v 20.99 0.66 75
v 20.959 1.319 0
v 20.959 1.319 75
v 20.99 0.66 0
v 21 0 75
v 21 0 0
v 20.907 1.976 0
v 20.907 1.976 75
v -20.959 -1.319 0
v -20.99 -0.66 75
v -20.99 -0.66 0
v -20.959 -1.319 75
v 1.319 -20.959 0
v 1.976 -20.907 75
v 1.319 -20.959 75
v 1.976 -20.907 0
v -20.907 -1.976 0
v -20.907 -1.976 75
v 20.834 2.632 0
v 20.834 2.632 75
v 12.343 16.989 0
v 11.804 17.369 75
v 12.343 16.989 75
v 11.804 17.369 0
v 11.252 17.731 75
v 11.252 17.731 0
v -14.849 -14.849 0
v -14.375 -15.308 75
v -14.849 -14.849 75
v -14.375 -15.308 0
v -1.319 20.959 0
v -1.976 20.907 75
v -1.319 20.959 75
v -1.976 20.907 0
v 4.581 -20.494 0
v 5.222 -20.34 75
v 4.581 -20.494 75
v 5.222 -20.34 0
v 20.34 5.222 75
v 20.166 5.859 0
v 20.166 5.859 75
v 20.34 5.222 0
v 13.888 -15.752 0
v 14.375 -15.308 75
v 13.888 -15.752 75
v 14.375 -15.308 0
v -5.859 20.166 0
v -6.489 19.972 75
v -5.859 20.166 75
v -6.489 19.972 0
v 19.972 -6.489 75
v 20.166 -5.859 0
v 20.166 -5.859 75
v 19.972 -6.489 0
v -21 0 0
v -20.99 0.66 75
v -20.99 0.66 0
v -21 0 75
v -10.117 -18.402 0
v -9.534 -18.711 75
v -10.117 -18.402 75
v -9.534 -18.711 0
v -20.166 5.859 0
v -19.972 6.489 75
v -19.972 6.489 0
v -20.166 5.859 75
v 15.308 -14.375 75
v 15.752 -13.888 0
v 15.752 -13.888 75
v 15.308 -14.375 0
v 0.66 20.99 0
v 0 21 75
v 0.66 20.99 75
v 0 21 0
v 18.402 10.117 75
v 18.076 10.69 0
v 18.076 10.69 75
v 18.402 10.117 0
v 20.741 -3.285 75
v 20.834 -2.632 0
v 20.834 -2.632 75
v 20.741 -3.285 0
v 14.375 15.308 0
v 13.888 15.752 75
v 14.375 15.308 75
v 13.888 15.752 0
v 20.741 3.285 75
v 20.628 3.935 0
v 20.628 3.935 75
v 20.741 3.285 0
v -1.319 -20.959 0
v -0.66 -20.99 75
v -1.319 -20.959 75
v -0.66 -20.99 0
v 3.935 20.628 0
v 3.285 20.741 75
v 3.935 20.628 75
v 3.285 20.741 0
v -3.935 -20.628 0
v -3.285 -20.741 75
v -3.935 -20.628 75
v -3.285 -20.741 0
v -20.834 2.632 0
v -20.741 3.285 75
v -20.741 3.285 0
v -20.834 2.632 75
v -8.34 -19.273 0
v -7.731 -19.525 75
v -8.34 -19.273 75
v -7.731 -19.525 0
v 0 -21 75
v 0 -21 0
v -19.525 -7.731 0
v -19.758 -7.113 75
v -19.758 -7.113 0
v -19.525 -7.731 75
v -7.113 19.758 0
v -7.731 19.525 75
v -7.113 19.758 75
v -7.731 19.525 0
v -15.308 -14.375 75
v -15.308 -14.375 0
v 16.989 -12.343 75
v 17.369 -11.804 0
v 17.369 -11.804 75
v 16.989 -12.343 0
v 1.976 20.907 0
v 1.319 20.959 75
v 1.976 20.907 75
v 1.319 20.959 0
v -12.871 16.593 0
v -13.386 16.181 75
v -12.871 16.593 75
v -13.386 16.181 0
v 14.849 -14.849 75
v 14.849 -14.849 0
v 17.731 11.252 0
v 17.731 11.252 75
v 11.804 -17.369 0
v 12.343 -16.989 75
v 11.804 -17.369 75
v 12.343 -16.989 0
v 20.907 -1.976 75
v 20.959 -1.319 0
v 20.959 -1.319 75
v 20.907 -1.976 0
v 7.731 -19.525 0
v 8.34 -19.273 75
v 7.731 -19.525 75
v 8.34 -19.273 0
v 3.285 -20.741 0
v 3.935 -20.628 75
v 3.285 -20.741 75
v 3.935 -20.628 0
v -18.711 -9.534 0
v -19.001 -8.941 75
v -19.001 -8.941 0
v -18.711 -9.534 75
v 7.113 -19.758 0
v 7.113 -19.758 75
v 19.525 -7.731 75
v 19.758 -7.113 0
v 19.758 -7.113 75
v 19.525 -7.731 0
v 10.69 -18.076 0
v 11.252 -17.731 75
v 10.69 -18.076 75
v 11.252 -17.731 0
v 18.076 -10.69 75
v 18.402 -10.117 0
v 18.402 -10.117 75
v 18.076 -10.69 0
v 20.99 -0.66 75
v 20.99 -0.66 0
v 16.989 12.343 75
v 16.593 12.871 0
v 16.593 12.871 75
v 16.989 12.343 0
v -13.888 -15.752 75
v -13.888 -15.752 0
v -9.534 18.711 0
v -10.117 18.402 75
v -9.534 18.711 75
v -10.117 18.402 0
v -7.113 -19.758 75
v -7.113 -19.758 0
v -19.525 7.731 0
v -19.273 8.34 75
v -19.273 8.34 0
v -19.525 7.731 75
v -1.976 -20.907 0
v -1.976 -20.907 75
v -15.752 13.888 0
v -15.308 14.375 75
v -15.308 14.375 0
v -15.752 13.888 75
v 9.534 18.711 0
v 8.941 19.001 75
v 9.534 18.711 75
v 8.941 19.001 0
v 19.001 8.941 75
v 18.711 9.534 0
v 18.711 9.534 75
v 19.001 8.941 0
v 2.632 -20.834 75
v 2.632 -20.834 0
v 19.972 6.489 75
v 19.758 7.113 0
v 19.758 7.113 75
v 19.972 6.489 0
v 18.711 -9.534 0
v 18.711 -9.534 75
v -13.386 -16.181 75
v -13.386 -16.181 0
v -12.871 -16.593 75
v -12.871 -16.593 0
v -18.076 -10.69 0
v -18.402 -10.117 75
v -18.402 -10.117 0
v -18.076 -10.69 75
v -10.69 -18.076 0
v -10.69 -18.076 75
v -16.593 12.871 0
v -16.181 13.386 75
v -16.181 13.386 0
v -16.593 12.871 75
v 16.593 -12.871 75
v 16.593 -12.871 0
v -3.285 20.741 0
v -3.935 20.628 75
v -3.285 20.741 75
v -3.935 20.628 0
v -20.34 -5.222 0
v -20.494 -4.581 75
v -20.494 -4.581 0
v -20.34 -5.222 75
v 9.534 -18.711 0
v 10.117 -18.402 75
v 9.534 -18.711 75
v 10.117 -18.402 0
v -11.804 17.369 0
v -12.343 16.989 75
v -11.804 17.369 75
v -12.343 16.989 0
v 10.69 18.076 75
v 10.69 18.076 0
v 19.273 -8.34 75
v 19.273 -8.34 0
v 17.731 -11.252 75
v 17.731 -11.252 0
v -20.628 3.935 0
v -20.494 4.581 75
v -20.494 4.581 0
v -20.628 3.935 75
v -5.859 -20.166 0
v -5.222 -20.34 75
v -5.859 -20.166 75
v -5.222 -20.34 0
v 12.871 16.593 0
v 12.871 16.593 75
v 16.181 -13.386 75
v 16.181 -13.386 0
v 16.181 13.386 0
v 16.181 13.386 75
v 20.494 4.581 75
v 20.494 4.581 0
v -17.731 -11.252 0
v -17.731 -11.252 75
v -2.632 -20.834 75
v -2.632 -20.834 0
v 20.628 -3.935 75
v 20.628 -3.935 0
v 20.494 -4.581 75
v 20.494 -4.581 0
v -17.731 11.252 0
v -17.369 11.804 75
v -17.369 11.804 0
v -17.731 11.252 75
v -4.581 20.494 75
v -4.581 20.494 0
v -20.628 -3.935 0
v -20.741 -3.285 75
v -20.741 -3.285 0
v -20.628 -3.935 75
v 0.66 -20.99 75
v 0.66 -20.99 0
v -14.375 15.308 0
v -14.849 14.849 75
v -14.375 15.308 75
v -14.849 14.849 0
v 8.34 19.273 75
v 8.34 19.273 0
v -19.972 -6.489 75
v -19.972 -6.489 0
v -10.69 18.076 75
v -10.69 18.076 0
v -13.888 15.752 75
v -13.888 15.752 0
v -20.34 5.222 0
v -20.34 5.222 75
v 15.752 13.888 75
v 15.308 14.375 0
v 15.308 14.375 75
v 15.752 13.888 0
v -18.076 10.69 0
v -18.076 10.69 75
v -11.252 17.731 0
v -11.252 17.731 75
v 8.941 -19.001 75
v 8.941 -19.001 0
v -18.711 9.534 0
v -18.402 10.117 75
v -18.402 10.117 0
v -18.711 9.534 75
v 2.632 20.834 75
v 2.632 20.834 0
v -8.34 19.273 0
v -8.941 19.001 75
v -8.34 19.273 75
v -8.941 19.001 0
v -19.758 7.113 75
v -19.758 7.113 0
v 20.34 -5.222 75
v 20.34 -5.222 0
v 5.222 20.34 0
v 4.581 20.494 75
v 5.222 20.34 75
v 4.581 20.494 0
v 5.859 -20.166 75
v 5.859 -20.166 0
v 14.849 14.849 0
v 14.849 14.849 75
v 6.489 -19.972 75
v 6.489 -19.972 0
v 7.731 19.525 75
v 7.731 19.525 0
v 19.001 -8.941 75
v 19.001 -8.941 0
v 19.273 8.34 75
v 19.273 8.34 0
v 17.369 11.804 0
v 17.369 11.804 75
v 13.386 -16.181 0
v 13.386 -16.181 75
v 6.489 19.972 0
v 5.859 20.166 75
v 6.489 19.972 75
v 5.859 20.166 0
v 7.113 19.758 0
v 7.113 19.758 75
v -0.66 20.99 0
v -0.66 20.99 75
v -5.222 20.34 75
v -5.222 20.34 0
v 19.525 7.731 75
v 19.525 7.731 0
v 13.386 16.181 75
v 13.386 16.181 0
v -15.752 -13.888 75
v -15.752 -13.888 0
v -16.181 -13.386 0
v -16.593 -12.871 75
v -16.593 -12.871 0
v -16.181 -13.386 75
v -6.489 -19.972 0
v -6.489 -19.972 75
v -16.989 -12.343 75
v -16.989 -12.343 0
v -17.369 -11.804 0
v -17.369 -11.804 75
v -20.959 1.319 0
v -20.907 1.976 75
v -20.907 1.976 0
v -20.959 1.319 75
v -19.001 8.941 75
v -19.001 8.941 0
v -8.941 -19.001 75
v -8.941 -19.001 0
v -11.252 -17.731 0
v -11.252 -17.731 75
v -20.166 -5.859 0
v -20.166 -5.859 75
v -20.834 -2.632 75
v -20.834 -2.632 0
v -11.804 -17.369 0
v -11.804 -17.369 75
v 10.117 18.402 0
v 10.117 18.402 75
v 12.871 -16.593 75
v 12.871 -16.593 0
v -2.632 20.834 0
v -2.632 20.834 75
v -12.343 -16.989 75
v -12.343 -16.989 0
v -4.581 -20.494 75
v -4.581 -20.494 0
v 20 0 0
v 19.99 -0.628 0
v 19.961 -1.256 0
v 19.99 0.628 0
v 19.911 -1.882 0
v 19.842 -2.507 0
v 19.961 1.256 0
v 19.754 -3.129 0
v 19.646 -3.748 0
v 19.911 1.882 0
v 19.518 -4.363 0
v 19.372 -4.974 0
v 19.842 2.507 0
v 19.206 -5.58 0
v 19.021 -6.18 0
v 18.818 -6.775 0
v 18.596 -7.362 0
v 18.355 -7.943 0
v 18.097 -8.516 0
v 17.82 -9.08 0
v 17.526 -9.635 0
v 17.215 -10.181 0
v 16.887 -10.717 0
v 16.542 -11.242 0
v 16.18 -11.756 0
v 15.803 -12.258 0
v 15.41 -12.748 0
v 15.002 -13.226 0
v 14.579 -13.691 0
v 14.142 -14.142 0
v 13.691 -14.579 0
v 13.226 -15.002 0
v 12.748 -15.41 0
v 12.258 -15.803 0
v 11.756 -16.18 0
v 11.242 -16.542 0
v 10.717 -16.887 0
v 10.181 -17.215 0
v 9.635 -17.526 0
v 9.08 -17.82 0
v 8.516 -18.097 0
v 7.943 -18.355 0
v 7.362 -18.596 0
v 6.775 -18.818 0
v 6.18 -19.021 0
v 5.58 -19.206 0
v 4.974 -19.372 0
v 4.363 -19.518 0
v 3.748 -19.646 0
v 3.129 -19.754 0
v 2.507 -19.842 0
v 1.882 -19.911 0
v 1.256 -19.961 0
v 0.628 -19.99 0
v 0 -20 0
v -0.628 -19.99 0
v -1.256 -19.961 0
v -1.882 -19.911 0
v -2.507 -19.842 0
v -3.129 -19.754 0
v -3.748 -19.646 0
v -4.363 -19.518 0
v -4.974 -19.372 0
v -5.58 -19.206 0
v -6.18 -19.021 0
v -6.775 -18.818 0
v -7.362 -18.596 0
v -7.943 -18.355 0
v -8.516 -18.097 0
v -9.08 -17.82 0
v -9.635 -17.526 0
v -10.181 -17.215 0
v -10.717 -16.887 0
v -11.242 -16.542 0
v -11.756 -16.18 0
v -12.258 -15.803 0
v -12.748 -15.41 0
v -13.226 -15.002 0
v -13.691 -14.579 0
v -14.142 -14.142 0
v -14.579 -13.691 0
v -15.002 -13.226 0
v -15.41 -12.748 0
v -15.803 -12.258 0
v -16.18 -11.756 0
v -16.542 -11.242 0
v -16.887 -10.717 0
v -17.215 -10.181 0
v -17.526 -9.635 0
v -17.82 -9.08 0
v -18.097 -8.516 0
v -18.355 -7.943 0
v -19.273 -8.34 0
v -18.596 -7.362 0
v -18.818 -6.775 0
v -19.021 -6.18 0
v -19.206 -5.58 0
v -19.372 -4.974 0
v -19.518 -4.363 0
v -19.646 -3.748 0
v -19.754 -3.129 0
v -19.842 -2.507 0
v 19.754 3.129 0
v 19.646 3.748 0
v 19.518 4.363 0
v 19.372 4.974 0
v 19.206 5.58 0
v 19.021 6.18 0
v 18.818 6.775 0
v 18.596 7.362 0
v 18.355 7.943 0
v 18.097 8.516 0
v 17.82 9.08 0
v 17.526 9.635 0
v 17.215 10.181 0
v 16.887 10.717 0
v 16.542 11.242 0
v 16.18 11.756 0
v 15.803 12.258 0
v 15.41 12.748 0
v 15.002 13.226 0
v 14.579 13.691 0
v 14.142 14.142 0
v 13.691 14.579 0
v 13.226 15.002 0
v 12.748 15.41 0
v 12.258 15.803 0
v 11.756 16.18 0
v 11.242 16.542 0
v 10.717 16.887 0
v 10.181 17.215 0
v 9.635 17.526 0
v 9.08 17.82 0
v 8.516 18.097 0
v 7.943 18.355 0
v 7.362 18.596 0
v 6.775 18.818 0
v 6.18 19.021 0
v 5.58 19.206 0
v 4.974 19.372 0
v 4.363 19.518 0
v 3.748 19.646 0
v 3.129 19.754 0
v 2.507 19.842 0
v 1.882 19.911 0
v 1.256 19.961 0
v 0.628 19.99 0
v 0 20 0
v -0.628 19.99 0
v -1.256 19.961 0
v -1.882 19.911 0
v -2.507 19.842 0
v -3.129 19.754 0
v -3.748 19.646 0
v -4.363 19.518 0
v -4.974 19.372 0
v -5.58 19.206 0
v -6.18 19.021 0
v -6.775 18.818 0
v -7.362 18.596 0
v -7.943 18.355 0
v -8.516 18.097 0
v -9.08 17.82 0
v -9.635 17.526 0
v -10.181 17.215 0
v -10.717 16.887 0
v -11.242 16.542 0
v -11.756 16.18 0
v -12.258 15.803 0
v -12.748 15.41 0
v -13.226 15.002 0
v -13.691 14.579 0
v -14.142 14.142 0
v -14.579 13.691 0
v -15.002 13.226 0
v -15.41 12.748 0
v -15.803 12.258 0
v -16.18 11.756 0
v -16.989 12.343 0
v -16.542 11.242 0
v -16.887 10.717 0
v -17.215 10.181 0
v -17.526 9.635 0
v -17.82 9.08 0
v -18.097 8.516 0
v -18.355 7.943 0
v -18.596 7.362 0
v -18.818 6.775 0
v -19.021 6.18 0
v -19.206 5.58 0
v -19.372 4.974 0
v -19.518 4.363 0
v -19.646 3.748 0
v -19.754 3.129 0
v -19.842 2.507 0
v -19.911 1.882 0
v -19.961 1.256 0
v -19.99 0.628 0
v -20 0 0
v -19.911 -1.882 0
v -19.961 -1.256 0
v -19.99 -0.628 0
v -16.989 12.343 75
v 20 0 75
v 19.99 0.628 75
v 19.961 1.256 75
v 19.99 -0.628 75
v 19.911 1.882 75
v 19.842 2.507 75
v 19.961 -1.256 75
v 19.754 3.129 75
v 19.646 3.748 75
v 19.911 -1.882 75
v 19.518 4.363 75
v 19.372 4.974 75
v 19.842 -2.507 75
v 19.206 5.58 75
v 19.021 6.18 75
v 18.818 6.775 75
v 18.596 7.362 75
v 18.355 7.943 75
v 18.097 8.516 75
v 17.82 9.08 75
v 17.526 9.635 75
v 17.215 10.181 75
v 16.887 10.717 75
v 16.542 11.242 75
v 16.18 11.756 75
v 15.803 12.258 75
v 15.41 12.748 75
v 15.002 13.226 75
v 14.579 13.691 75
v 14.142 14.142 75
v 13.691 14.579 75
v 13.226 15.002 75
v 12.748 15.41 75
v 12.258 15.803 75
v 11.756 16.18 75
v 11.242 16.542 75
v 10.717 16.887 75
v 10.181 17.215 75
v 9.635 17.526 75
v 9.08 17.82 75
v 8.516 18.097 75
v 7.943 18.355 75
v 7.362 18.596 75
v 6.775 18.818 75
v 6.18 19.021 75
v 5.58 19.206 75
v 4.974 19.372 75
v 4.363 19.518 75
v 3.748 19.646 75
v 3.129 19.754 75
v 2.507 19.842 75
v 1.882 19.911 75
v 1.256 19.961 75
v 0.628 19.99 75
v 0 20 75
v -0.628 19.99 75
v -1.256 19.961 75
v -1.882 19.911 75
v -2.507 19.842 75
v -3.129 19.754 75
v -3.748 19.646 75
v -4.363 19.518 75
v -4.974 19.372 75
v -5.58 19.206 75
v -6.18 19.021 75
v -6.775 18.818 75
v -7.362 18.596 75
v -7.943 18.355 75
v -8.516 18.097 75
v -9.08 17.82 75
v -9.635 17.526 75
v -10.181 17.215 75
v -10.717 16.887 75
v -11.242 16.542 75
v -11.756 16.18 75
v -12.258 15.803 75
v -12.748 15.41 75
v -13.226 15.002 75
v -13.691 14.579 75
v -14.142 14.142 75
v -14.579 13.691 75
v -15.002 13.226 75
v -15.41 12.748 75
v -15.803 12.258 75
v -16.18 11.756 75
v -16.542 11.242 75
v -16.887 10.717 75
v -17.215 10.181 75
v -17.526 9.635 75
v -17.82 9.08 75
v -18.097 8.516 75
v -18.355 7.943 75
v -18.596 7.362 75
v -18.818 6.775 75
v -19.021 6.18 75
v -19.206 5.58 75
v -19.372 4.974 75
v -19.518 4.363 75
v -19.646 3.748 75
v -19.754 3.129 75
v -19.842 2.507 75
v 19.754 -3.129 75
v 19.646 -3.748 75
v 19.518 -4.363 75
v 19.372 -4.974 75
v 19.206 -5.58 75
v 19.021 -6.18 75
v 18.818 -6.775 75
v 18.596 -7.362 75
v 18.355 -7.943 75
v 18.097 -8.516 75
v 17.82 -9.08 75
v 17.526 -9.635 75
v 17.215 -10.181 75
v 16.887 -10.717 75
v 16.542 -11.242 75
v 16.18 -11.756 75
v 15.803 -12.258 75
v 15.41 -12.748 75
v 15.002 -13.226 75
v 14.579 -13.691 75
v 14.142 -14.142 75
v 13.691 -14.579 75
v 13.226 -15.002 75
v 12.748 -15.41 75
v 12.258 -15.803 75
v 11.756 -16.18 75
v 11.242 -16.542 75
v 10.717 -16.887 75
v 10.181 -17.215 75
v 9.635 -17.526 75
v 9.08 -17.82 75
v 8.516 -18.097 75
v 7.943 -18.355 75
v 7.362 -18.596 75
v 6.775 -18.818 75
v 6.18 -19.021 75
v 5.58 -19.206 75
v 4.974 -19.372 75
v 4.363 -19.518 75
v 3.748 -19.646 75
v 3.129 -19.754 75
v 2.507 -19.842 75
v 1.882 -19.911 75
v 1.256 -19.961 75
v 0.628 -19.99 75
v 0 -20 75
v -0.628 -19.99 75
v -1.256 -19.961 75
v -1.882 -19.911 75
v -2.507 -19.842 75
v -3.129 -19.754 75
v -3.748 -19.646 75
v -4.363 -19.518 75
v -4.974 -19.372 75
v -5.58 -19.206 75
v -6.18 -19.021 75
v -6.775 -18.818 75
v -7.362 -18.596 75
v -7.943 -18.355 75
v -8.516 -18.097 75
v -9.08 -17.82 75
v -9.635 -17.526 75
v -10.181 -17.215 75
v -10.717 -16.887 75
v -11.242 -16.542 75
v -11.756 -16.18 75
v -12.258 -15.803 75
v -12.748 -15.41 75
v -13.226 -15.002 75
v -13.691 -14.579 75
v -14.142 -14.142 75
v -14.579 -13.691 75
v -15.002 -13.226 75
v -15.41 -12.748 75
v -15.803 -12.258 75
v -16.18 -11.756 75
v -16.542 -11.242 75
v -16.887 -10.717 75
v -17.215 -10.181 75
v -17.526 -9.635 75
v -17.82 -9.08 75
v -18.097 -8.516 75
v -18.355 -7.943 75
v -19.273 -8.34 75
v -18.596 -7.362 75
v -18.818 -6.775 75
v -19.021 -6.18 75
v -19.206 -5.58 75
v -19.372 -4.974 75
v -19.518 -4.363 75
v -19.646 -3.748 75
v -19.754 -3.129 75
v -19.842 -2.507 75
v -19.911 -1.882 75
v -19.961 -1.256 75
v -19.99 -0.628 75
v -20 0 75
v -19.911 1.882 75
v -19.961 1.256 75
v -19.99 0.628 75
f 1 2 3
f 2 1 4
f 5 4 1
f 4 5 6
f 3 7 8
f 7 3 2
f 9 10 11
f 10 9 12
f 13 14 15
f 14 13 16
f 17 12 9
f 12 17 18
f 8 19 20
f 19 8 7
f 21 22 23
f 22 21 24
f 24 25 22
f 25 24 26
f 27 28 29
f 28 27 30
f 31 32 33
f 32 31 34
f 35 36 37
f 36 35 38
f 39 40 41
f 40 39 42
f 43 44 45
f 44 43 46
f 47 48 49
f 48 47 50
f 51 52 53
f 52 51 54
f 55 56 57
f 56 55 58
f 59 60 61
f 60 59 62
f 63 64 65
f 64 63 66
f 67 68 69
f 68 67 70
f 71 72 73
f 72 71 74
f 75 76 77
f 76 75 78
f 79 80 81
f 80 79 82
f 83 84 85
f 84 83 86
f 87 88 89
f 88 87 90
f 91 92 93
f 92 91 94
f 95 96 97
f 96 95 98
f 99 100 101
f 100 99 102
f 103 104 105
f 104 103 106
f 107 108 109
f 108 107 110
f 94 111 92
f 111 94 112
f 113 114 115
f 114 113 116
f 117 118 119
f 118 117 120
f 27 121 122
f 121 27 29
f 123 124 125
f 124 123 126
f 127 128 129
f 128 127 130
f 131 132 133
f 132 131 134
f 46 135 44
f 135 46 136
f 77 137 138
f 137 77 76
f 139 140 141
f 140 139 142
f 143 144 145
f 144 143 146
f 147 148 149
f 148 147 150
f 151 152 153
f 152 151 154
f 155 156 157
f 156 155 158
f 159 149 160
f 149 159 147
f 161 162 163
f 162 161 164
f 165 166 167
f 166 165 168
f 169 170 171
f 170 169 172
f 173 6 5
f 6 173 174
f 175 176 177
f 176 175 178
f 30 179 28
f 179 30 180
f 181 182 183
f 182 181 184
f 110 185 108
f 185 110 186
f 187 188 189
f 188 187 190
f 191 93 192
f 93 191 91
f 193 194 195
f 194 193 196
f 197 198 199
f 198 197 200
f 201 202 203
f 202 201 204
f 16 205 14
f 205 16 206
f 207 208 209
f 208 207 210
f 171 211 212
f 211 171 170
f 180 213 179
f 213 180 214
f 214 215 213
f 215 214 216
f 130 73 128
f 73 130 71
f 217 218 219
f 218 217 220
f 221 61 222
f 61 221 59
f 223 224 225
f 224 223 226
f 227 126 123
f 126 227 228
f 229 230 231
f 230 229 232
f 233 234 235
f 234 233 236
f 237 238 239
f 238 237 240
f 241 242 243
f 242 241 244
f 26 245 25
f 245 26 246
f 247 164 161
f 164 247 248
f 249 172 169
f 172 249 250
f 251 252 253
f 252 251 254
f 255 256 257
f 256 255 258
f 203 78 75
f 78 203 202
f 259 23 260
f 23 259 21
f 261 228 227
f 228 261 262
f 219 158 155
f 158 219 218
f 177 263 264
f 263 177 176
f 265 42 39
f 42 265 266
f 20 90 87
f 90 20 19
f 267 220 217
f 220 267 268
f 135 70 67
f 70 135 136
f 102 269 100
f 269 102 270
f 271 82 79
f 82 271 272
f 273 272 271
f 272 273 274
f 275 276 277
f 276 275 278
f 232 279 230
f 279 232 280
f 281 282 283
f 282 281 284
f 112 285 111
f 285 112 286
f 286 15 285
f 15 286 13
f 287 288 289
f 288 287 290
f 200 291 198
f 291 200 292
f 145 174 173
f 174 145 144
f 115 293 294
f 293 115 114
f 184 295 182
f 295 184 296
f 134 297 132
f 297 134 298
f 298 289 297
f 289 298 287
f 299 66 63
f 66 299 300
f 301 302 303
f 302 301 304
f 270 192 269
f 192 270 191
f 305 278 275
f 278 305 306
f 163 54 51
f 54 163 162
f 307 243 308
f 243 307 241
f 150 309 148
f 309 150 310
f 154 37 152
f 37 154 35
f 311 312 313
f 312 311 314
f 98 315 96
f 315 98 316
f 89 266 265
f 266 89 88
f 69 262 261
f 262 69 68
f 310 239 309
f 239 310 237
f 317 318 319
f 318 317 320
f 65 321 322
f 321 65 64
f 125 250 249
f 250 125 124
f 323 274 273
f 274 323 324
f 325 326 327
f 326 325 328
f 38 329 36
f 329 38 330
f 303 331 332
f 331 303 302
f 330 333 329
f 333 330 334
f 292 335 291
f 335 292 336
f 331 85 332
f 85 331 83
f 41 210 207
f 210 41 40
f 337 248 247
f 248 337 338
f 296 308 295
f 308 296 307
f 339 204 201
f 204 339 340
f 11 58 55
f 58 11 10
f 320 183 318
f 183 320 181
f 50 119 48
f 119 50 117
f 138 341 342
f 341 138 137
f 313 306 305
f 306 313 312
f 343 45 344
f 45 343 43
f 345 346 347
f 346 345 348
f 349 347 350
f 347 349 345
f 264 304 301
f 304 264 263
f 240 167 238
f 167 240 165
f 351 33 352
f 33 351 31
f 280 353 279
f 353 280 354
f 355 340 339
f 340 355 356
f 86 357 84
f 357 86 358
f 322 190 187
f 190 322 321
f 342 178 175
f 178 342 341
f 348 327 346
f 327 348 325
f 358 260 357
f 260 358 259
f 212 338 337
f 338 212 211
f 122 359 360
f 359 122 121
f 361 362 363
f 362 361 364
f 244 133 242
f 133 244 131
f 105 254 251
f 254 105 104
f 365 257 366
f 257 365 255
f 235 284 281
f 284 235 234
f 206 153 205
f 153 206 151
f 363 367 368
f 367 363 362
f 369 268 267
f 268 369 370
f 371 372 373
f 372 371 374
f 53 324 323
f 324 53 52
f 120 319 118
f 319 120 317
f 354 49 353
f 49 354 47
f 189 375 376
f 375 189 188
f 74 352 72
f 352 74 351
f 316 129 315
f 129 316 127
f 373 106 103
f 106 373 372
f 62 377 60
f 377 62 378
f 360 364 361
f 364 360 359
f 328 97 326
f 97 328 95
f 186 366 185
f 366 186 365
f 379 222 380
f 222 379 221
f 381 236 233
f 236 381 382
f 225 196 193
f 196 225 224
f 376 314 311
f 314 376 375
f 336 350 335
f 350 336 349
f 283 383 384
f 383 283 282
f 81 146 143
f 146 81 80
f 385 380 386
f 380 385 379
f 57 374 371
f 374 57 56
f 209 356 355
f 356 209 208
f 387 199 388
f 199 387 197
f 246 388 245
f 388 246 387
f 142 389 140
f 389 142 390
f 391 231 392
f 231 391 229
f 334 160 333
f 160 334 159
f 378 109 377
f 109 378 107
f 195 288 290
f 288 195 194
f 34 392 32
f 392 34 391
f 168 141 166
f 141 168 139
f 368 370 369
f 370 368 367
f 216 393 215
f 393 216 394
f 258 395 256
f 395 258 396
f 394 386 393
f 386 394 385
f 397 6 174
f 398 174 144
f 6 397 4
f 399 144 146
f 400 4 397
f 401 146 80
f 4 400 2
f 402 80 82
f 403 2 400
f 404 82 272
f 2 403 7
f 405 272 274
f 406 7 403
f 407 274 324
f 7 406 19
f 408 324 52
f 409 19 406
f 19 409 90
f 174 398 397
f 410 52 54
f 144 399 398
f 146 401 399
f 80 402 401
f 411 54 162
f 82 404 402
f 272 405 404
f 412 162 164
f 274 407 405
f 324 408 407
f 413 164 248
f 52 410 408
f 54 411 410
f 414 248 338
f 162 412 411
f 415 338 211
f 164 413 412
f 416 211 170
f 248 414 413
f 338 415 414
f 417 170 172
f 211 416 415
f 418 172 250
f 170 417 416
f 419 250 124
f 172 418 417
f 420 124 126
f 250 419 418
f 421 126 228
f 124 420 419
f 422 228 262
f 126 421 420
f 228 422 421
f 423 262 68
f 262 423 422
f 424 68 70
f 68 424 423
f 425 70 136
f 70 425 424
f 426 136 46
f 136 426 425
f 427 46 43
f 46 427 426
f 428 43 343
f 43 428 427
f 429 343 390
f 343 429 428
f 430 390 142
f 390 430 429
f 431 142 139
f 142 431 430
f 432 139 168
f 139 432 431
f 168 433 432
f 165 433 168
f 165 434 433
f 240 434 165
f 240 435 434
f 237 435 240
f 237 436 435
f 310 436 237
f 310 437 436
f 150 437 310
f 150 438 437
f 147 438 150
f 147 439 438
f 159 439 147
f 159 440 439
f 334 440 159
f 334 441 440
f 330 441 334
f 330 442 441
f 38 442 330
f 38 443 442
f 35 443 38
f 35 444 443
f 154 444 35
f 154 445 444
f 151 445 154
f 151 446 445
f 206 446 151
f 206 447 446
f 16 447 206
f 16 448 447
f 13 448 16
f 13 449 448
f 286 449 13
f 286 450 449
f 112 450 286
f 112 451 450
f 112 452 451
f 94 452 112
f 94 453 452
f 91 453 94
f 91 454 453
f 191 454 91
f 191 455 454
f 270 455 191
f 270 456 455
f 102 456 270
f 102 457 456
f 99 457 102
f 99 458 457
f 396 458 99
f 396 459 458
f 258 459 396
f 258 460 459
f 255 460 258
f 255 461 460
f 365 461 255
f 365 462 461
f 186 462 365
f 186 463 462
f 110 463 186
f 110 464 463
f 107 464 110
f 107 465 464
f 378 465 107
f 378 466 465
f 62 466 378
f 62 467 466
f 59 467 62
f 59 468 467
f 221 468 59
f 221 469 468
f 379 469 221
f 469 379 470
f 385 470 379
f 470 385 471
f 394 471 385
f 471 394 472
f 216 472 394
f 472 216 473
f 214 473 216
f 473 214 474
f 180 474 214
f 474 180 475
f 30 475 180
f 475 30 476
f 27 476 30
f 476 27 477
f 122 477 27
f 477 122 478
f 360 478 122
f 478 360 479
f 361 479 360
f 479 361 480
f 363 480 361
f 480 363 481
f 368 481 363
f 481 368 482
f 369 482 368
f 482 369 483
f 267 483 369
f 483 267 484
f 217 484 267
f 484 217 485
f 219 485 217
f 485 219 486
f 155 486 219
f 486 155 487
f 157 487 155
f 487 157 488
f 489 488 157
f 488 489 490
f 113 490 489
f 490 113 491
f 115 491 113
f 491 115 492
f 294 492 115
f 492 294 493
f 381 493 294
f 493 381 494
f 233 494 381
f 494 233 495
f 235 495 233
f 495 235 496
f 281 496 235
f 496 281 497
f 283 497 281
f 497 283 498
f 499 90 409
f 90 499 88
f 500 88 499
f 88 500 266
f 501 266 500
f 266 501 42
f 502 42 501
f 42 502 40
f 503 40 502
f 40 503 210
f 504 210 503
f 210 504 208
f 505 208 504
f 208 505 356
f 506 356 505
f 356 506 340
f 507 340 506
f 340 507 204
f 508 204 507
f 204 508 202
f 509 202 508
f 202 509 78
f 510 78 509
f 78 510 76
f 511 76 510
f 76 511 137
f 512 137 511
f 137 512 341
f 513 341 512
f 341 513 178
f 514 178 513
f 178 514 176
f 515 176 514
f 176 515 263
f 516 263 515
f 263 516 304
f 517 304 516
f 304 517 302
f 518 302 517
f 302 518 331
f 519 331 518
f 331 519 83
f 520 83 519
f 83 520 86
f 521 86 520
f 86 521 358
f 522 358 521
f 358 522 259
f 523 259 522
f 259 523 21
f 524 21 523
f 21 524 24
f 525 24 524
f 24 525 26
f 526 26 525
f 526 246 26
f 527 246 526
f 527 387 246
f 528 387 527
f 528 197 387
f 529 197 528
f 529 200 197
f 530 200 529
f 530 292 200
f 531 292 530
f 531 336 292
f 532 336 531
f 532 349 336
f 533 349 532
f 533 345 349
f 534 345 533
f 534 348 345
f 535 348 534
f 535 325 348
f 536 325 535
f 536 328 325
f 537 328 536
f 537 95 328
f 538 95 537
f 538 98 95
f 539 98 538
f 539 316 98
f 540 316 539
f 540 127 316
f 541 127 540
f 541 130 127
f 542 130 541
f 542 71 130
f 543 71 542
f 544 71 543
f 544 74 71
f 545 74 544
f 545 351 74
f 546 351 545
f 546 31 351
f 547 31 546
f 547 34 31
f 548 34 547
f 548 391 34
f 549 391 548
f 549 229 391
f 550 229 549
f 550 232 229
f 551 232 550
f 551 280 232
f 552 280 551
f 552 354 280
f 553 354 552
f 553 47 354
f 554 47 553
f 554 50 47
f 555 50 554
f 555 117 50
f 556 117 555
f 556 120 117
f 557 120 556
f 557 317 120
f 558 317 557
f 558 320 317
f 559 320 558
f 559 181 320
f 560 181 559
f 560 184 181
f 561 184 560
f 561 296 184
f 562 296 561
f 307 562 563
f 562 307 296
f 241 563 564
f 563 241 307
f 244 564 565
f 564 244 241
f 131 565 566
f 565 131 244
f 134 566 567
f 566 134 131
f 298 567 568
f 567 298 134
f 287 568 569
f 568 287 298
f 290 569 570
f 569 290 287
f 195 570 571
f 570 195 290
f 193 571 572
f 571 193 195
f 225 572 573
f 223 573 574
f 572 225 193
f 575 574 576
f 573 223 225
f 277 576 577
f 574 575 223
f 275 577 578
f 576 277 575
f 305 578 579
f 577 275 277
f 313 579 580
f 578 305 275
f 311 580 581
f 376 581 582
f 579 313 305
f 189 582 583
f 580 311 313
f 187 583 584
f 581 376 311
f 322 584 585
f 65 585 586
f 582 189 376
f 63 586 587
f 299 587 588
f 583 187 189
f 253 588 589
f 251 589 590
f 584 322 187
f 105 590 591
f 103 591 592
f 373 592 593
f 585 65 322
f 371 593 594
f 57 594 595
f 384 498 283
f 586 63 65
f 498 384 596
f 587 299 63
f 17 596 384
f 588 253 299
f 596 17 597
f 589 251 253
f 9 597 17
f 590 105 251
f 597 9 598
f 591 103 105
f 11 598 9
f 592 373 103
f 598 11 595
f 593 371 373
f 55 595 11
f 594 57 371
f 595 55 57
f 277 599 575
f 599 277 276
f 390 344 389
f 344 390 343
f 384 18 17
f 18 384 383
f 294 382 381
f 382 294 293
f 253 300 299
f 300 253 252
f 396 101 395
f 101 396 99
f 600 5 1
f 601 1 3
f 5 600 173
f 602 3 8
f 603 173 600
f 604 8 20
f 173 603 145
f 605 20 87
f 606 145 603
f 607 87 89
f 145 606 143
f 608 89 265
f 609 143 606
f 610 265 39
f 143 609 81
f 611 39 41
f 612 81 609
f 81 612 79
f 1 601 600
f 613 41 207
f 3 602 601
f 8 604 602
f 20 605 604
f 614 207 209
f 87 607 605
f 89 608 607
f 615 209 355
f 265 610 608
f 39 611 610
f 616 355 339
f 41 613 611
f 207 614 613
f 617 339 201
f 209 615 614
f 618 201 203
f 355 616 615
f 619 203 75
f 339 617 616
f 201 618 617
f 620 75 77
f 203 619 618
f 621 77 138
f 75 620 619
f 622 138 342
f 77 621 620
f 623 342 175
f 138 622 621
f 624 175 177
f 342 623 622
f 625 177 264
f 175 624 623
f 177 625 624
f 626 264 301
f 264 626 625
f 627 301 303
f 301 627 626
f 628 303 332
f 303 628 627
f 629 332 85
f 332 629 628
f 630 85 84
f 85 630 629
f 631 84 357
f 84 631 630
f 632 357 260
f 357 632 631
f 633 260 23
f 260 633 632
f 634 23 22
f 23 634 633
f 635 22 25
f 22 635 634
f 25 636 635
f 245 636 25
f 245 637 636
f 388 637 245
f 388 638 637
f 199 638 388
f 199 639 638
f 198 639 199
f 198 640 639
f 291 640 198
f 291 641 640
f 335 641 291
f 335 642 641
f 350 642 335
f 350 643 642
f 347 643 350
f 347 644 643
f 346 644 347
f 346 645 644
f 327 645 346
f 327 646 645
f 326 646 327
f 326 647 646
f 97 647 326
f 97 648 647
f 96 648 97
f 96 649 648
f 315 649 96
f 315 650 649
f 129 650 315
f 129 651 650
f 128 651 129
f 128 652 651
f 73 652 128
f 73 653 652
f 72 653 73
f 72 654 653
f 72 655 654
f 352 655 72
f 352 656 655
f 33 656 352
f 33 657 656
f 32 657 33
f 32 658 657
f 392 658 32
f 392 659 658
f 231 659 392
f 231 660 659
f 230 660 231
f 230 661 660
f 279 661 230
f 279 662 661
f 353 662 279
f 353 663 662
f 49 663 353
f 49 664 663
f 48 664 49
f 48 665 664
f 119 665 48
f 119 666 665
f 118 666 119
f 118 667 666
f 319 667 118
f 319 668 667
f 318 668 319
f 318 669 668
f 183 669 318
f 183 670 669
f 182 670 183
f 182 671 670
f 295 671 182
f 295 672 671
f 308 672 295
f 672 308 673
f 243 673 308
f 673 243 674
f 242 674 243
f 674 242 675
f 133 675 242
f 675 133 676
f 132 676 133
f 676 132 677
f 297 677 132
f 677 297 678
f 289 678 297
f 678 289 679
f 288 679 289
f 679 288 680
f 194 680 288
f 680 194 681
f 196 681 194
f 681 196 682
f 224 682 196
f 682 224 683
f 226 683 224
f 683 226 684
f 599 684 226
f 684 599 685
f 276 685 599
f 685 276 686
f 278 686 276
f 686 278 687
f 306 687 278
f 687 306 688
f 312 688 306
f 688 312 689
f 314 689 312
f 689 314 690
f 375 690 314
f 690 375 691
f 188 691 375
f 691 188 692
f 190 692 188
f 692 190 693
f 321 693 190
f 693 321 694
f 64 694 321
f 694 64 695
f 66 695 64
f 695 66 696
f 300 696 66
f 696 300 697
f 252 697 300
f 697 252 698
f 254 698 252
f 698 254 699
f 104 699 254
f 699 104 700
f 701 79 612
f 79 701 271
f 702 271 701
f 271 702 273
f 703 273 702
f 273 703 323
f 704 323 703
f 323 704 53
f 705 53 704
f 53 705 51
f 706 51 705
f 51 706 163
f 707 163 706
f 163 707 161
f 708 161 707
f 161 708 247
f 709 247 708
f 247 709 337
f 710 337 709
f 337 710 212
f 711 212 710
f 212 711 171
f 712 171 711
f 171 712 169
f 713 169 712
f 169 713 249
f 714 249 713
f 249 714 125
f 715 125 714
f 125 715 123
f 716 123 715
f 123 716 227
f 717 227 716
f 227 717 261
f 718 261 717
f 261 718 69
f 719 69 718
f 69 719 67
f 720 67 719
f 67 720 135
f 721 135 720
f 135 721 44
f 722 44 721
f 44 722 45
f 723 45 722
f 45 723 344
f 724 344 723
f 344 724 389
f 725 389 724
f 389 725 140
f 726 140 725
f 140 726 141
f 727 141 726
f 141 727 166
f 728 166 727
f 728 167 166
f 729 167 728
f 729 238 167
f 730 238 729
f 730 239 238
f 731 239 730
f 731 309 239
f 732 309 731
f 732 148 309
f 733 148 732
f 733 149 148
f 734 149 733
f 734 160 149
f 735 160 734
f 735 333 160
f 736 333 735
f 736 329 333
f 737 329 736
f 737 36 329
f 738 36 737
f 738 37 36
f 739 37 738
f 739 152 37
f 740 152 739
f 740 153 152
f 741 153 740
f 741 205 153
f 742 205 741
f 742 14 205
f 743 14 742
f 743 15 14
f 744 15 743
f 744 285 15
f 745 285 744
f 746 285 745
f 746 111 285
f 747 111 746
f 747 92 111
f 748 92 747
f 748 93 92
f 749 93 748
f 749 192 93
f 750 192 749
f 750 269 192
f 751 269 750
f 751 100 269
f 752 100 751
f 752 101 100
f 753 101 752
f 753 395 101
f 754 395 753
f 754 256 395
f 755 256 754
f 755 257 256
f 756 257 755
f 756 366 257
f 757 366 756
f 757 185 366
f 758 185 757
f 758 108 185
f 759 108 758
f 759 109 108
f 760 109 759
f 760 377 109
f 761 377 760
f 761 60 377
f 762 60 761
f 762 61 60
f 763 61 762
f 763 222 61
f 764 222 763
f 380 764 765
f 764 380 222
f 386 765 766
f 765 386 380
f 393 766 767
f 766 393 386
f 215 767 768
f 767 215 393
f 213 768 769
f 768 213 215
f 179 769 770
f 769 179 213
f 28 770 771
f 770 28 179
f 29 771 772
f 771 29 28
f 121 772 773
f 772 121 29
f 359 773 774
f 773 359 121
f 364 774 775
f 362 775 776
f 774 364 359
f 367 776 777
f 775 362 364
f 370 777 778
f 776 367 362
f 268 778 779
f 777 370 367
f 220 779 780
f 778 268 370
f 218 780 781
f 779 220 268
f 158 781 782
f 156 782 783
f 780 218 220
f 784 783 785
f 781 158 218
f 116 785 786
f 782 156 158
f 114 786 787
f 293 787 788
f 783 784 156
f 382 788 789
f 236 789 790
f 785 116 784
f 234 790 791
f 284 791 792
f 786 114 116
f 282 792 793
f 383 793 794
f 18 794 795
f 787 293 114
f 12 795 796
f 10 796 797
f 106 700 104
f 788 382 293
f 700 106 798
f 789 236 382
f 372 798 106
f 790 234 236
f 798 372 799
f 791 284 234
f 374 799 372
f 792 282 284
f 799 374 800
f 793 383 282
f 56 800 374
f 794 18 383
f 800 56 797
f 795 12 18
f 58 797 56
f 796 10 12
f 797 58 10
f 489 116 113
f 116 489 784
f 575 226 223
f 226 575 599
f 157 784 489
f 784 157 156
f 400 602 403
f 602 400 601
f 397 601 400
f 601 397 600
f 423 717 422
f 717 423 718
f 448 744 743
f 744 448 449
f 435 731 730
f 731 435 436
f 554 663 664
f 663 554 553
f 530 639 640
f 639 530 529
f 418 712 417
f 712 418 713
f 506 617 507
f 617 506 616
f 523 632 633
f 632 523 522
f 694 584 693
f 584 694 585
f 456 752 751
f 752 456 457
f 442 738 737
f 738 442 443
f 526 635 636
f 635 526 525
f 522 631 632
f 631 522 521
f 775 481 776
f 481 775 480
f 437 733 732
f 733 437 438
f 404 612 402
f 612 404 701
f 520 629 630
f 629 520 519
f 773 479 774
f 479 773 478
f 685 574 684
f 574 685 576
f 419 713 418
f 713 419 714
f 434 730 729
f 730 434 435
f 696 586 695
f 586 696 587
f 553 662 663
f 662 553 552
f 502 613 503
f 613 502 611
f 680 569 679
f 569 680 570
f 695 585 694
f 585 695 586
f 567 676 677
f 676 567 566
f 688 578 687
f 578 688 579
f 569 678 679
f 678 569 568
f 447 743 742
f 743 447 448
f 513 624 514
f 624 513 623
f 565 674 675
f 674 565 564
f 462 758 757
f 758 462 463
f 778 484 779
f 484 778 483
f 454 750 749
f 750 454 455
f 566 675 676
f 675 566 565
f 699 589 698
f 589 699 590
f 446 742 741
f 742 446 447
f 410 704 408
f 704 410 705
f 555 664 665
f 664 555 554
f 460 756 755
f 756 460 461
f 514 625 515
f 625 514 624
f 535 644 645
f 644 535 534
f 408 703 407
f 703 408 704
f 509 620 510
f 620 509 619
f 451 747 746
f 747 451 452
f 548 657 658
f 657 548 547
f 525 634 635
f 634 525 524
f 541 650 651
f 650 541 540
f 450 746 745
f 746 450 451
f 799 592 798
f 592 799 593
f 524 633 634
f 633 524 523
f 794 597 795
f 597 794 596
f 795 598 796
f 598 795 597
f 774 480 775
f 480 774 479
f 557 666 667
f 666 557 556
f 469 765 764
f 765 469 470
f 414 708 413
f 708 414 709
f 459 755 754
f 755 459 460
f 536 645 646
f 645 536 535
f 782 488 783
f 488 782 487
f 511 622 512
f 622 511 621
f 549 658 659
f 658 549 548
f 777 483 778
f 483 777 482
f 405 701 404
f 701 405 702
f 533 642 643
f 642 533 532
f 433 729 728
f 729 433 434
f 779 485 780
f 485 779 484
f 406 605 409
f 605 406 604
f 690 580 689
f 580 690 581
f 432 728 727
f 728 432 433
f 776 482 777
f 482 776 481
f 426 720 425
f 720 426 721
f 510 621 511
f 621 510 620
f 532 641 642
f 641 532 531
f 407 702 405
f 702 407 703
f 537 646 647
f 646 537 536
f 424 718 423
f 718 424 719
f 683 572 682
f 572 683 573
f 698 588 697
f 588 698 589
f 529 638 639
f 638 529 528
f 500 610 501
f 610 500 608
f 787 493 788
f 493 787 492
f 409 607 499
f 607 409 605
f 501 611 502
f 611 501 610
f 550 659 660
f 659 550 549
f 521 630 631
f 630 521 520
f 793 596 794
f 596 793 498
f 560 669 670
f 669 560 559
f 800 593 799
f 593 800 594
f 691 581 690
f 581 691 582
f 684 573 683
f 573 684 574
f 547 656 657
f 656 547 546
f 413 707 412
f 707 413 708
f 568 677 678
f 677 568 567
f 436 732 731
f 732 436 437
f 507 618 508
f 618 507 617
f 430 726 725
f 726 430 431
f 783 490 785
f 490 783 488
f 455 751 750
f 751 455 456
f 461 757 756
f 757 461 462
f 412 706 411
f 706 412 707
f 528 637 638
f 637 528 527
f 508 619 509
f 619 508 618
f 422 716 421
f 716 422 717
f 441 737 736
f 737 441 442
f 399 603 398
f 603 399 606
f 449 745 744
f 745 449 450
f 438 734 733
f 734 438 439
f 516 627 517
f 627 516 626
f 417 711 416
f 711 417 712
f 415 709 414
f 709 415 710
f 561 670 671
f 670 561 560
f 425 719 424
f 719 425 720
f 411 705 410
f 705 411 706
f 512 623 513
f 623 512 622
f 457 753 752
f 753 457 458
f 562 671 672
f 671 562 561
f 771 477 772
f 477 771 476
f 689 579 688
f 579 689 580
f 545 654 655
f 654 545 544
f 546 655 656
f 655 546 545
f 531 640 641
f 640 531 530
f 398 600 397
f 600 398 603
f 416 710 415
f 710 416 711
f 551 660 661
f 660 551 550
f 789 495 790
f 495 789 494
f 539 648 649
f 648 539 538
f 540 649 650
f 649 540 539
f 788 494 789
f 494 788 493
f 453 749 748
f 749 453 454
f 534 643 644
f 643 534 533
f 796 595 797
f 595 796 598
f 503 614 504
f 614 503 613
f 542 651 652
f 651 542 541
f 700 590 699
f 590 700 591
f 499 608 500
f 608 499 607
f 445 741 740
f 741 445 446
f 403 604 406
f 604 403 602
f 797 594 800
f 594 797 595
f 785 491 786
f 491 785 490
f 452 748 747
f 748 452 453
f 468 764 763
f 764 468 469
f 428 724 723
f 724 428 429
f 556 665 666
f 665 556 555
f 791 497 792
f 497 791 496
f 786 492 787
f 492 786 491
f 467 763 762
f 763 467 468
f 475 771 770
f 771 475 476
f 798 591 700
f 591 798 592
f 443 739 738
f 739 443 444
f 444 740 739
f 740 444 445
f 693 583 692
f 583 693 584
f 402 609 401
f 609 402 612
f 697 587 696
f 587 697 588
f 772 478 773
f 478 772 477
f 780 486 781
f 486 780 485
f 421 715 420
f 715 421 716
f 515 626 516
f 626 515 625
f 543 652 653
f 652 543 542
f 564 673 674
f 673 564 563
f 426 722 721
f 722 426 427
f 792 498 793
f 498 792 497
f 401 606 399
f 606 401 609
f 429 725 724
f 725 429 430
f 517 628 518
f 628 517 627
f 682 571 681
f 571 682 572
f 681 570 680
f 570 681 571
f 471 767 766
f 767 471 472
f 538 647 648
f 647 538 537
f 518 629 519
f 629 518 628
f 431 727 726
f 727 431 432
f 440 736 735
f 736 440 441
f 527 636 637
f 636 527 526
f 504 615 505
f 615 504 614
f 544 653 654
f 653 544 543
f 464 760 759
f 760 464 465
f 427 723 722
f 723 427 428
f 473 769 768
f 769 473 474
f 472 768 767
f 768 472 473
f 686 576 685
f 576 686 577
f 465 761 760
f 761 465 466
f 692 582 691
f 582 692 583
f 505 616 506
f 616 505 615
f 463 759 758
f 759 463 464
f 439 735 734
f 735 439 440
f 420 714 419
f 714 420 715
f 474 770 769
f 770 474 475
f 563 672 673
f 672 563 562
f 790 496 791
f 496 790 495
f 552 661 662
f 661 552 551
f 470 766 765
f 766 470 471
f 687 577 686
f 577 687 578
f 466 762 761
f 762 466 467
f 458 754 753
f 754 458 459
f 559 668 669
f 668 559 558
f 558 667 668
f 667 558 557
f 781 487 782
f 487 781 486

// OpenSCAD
$fn = 200;
main_radius = 20;
thickness = 1;
height = 75;

module cylinder_bag_mould(
    main_radius = main_radius,
    height = height,
    thickness = thickness) {
    difference() {
        cylinder(r = main_radius + thickness, h = height, $fn = $fn);
        cylinder(r = main_radius, h = height, $fn = $fn);
    }
}

cylinder_bag_mould();
